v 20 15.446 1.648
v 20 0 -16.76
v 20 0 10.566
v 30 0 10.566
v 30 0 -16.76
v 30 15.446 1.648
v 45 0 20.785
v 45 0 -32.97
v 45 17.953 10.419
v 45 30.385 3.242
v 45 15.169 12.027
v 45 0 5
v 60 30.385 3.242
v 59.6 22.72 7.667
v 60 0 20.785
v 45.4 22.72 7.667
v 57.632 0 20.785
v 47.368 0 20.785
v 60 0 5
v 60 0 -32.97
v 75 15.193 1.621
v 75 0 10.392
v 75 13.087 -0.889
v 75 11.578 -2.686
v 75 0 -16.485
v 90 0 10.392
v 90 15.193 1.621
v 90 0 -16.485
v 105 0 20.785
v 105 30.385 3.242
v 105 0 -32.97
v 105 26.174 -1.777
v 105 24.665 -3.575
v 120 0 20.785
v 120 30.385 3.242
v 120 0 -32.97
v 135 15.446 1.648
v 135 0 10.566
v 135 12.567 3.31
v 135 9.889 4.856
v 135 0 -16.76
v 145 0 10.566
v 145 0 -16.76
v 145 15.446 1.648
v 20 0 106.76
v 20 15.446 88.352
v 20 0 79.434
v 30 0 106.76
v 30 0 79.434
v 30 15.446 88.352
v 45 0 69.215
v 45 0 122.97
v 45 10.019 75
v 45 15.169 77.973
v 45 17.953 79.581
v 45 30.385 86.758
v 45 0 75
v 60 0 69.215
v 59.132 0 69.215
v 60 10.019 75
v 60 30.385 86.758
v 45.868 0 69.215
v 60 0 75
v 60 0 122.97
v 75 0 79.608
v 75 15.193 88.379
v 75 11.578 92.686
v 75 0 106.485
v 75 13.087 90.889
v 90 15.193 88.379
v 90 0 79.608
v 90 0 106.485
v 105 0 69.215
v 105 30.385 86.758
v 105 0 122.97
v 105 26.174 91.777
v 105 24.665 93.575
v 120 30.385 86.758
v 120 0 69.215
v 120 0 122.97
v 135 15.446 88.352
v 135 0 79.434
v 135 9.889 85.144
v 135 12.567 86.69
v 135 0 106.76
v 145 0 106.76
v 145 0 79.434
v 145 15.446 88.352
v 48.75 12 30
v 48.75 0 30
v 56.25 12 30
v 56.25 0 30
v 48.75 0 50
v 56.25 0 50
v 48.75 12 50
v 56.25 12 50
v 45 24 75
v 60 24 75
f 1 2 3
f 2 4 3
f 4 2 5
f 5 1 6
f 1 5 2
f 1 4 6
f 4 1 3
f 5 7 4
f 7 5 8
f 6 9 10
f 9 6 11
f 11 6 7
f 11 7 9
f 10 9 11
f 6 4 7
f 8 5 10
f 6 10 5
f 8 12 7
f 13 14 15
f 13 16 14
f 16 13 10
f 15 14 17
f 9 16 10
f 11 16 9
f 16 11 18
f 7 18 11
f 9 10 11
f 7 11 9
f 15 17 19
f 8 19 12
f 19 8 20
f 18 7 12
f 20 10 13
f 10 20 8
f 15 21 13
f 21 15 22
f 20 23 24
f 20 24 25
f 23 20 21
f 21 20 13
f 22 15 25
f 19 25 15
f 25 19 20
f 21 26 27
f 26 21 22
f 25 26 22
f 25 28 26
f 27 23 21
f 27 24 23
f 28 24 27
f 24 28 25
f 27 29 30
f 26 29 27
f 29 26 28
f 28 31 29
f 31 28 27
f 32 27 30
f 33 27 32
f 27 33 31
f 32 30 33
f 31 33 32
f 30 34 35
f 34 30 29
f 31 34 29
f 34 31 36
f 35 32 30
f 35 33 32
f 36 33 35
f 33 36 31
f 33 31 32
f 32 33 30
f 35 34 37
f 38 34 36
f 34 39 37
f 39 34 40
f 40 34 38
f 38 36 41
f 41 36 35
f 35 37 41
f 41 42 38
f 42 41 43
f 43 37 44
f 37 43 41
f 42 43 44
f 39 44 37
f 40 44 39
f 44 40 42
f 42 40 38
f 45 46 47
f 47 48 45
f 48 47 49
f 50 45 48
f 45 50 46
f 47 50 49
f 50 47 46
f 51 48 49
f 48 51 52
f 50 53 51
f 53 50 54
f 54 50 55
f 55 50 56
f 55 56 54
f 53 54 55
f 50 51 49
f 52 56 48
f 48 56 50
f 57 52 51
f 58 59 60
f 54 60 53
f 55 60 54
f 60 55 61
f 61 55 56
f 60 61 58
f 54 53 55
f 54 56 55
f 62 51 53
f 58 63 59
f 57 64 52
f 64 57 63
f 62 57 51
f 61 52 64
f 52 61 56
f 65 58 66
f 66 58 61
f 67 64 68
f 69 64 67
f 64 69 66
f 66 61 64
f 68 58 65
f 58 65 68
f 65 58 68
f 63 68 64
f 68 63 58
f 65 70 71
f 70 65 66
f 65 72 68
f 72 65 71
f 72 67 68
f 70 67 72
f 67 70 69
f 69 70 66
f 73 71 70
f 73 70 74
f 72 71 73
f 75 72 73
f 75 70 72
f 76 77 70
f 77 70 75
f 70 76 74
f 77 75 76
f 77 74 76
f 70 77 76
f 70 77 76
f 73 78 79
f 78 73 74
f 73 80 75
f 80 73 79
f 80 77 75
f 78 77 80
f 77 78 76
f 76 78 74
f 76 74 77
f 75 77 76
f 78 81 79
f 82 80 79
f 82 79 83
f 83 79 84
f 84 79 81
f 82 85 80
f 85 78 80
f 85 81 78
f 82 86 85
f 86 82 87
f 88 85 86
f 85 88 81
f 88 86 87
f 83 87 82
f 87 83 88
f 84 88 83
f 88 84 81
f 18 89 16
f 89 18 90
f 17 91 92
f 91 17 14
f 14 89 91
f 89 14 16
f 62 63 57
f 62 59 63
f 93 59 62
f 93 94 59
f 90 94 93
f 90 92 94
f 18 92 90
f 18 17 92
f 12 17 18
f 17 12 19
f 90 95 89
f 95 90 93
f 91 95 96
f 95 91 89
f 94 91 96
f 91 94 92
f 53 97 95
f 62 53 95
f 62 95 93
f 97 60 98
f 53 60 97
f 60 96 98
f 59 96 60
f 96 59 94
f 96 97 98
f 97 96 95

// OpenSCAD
//-*- C -*-
//http://www.mathalino.com/reviewer/derivation-of-formulas/derivation-of-formula-for-radius-of-incircle
// nPnts = number of points (minimum 3)
// outer = radius to outer points
// inR = radius to inner circle
//           ..
//          /  \.
//         /  2   \.
//        /   |      \.
//       / 1'  .  3'     \.
//      /   ./   -\ .       \.
//     / 3 /   2'      \.   1   \
//    ---------------------------
//
module triAng(cornAng1, cornAng2, inR) {
	gama3=180-cornAng1-cornAng2;
	// polar to cartesian: radius/angle to x/y
	function x(r, a) = r * cos(a);
	function y(r, a) = r * sin(a);
	// angular width of each pie slice of the triAng
	//union() {
		//for (p = [0 : nPnts-1]) {
			// outer is outer point p
			// inner is inner point following p
			// next is next outer point following p

			tpi1=-cornAng1/2;
			x1 = x(inR/sin(cornAng1/2), tpi1);
			y1 = y(inR/sin(cornAng1/2), tpi1);
			tpi2 = tpi1 + 180-cornAng1/2-cornAng2/2;
			x2 = x(inR/sin(cornAng2/2), tpi2);
			y2 = y(inR/sin(cornAng2/2), tpi2);
			tpi3 = tpi2 + 180-cornAng2/2-gama3/2;
			x3 = x(inR/sin(gama3/2), tpi3);
			y3 = y(inR/sin(gama3/2), tpi3);

			translate([0,-y1,0])
			polygon(points = [[x1, y1], [x2, y2], [x3, y3]], paths = [[0, 1, 2]]);

		//}
	//}
}


module linxtrude(xx, hheight, sscale)
{ translate([xx,0,0]) rotate([0,90,0]) linear_extrude(height = hheight, center=false, convexity=10, twist=0, slices=1, scale = sscale)  children(); }

module poreThroatPore() {

cornAng1 = 40;
cornAng2 = 80;
contractRatio = 2;
Rpore = 12;
Rtrot = Rpore/contractRatio;
RtrotB = Rtrot+0.1;

linxtrude( 0,   10.000001,  1.)           triAng(cornAng1,cornAng2,RtrotB);
linxtrude( 0,   10.000001,  1.)           triAng(cornAng1,cornAng2,RtrotB);
linxtrude( 10,  15.000001,  Rpore/RtrotB) triAng(cornAng1,cornAng2,RtrotB);
linxtrude( 25,  15.000001,  1)            triAng(cornAng1,cornAng2,Rpore);
linxtrude( 40,  15.000001,  Rtrot/Rpore)  triAng(cornAng1,cornAng2,Rpore);
linxtrude( 55,  15.000001,  1)            triAng(cornAng1,cornAng2,Rtrot);
linxtrude( 70,  15.000001,  Rpore/Rtrot)  triAng(cornAng1,cornAng2,Rtrot);
linxtrude( 85,  15.000001,  1)            triAng(cornAng1,cornAng2,Rpore);
linxtrude( 100, 15.000001,  RtrotB/Rpore) triAng(cornAng1,cornAng2,Rpore);
linxtrude( 115, 10.000001,  1)            triAng(cornAng1,cornAng2,RtrotB);

}

module linytrude(yy, hheight, sscale)
{ translate([0,0,yy]) linear_extrude(height = hheight, center=false, convexity=10, twist=0, slices=1, scale = sscale)   children(); }


module throatz() {
cornAng1 = 40;
cornAng2 = 80;
contractRatio = 2;
Rpore = 12;
Rtrot = Rpore/contractRatio;
RtrotB = Rtrot+0.1;
linytrude(5 , 25.000001, Rtrot/Rpore) translate([-15.000001/2,0,0])             square([15.000001,Rpore*2],center=false);
linytrude(30, 20.000001, 1)           translate([-15.000001/2*Rtrot/Rpore,0,0]) square([15.000001*Rtrot/Rpore,Rtrot*2],center=false);
linytrude(50, 25.000001, Rpore/Rtrot) translate([-15.000001/2*Rtrot/Rpore,0,0]) square([15.000001*Rtrot/Rpore,Rtrot*2],center=false);
}


translate([20,0,0]) poreThroatPore();

translate([20,0,90]) mirror([0,0,1]) poreThroatPore();

translate([52.5,0,0]) throatz();
